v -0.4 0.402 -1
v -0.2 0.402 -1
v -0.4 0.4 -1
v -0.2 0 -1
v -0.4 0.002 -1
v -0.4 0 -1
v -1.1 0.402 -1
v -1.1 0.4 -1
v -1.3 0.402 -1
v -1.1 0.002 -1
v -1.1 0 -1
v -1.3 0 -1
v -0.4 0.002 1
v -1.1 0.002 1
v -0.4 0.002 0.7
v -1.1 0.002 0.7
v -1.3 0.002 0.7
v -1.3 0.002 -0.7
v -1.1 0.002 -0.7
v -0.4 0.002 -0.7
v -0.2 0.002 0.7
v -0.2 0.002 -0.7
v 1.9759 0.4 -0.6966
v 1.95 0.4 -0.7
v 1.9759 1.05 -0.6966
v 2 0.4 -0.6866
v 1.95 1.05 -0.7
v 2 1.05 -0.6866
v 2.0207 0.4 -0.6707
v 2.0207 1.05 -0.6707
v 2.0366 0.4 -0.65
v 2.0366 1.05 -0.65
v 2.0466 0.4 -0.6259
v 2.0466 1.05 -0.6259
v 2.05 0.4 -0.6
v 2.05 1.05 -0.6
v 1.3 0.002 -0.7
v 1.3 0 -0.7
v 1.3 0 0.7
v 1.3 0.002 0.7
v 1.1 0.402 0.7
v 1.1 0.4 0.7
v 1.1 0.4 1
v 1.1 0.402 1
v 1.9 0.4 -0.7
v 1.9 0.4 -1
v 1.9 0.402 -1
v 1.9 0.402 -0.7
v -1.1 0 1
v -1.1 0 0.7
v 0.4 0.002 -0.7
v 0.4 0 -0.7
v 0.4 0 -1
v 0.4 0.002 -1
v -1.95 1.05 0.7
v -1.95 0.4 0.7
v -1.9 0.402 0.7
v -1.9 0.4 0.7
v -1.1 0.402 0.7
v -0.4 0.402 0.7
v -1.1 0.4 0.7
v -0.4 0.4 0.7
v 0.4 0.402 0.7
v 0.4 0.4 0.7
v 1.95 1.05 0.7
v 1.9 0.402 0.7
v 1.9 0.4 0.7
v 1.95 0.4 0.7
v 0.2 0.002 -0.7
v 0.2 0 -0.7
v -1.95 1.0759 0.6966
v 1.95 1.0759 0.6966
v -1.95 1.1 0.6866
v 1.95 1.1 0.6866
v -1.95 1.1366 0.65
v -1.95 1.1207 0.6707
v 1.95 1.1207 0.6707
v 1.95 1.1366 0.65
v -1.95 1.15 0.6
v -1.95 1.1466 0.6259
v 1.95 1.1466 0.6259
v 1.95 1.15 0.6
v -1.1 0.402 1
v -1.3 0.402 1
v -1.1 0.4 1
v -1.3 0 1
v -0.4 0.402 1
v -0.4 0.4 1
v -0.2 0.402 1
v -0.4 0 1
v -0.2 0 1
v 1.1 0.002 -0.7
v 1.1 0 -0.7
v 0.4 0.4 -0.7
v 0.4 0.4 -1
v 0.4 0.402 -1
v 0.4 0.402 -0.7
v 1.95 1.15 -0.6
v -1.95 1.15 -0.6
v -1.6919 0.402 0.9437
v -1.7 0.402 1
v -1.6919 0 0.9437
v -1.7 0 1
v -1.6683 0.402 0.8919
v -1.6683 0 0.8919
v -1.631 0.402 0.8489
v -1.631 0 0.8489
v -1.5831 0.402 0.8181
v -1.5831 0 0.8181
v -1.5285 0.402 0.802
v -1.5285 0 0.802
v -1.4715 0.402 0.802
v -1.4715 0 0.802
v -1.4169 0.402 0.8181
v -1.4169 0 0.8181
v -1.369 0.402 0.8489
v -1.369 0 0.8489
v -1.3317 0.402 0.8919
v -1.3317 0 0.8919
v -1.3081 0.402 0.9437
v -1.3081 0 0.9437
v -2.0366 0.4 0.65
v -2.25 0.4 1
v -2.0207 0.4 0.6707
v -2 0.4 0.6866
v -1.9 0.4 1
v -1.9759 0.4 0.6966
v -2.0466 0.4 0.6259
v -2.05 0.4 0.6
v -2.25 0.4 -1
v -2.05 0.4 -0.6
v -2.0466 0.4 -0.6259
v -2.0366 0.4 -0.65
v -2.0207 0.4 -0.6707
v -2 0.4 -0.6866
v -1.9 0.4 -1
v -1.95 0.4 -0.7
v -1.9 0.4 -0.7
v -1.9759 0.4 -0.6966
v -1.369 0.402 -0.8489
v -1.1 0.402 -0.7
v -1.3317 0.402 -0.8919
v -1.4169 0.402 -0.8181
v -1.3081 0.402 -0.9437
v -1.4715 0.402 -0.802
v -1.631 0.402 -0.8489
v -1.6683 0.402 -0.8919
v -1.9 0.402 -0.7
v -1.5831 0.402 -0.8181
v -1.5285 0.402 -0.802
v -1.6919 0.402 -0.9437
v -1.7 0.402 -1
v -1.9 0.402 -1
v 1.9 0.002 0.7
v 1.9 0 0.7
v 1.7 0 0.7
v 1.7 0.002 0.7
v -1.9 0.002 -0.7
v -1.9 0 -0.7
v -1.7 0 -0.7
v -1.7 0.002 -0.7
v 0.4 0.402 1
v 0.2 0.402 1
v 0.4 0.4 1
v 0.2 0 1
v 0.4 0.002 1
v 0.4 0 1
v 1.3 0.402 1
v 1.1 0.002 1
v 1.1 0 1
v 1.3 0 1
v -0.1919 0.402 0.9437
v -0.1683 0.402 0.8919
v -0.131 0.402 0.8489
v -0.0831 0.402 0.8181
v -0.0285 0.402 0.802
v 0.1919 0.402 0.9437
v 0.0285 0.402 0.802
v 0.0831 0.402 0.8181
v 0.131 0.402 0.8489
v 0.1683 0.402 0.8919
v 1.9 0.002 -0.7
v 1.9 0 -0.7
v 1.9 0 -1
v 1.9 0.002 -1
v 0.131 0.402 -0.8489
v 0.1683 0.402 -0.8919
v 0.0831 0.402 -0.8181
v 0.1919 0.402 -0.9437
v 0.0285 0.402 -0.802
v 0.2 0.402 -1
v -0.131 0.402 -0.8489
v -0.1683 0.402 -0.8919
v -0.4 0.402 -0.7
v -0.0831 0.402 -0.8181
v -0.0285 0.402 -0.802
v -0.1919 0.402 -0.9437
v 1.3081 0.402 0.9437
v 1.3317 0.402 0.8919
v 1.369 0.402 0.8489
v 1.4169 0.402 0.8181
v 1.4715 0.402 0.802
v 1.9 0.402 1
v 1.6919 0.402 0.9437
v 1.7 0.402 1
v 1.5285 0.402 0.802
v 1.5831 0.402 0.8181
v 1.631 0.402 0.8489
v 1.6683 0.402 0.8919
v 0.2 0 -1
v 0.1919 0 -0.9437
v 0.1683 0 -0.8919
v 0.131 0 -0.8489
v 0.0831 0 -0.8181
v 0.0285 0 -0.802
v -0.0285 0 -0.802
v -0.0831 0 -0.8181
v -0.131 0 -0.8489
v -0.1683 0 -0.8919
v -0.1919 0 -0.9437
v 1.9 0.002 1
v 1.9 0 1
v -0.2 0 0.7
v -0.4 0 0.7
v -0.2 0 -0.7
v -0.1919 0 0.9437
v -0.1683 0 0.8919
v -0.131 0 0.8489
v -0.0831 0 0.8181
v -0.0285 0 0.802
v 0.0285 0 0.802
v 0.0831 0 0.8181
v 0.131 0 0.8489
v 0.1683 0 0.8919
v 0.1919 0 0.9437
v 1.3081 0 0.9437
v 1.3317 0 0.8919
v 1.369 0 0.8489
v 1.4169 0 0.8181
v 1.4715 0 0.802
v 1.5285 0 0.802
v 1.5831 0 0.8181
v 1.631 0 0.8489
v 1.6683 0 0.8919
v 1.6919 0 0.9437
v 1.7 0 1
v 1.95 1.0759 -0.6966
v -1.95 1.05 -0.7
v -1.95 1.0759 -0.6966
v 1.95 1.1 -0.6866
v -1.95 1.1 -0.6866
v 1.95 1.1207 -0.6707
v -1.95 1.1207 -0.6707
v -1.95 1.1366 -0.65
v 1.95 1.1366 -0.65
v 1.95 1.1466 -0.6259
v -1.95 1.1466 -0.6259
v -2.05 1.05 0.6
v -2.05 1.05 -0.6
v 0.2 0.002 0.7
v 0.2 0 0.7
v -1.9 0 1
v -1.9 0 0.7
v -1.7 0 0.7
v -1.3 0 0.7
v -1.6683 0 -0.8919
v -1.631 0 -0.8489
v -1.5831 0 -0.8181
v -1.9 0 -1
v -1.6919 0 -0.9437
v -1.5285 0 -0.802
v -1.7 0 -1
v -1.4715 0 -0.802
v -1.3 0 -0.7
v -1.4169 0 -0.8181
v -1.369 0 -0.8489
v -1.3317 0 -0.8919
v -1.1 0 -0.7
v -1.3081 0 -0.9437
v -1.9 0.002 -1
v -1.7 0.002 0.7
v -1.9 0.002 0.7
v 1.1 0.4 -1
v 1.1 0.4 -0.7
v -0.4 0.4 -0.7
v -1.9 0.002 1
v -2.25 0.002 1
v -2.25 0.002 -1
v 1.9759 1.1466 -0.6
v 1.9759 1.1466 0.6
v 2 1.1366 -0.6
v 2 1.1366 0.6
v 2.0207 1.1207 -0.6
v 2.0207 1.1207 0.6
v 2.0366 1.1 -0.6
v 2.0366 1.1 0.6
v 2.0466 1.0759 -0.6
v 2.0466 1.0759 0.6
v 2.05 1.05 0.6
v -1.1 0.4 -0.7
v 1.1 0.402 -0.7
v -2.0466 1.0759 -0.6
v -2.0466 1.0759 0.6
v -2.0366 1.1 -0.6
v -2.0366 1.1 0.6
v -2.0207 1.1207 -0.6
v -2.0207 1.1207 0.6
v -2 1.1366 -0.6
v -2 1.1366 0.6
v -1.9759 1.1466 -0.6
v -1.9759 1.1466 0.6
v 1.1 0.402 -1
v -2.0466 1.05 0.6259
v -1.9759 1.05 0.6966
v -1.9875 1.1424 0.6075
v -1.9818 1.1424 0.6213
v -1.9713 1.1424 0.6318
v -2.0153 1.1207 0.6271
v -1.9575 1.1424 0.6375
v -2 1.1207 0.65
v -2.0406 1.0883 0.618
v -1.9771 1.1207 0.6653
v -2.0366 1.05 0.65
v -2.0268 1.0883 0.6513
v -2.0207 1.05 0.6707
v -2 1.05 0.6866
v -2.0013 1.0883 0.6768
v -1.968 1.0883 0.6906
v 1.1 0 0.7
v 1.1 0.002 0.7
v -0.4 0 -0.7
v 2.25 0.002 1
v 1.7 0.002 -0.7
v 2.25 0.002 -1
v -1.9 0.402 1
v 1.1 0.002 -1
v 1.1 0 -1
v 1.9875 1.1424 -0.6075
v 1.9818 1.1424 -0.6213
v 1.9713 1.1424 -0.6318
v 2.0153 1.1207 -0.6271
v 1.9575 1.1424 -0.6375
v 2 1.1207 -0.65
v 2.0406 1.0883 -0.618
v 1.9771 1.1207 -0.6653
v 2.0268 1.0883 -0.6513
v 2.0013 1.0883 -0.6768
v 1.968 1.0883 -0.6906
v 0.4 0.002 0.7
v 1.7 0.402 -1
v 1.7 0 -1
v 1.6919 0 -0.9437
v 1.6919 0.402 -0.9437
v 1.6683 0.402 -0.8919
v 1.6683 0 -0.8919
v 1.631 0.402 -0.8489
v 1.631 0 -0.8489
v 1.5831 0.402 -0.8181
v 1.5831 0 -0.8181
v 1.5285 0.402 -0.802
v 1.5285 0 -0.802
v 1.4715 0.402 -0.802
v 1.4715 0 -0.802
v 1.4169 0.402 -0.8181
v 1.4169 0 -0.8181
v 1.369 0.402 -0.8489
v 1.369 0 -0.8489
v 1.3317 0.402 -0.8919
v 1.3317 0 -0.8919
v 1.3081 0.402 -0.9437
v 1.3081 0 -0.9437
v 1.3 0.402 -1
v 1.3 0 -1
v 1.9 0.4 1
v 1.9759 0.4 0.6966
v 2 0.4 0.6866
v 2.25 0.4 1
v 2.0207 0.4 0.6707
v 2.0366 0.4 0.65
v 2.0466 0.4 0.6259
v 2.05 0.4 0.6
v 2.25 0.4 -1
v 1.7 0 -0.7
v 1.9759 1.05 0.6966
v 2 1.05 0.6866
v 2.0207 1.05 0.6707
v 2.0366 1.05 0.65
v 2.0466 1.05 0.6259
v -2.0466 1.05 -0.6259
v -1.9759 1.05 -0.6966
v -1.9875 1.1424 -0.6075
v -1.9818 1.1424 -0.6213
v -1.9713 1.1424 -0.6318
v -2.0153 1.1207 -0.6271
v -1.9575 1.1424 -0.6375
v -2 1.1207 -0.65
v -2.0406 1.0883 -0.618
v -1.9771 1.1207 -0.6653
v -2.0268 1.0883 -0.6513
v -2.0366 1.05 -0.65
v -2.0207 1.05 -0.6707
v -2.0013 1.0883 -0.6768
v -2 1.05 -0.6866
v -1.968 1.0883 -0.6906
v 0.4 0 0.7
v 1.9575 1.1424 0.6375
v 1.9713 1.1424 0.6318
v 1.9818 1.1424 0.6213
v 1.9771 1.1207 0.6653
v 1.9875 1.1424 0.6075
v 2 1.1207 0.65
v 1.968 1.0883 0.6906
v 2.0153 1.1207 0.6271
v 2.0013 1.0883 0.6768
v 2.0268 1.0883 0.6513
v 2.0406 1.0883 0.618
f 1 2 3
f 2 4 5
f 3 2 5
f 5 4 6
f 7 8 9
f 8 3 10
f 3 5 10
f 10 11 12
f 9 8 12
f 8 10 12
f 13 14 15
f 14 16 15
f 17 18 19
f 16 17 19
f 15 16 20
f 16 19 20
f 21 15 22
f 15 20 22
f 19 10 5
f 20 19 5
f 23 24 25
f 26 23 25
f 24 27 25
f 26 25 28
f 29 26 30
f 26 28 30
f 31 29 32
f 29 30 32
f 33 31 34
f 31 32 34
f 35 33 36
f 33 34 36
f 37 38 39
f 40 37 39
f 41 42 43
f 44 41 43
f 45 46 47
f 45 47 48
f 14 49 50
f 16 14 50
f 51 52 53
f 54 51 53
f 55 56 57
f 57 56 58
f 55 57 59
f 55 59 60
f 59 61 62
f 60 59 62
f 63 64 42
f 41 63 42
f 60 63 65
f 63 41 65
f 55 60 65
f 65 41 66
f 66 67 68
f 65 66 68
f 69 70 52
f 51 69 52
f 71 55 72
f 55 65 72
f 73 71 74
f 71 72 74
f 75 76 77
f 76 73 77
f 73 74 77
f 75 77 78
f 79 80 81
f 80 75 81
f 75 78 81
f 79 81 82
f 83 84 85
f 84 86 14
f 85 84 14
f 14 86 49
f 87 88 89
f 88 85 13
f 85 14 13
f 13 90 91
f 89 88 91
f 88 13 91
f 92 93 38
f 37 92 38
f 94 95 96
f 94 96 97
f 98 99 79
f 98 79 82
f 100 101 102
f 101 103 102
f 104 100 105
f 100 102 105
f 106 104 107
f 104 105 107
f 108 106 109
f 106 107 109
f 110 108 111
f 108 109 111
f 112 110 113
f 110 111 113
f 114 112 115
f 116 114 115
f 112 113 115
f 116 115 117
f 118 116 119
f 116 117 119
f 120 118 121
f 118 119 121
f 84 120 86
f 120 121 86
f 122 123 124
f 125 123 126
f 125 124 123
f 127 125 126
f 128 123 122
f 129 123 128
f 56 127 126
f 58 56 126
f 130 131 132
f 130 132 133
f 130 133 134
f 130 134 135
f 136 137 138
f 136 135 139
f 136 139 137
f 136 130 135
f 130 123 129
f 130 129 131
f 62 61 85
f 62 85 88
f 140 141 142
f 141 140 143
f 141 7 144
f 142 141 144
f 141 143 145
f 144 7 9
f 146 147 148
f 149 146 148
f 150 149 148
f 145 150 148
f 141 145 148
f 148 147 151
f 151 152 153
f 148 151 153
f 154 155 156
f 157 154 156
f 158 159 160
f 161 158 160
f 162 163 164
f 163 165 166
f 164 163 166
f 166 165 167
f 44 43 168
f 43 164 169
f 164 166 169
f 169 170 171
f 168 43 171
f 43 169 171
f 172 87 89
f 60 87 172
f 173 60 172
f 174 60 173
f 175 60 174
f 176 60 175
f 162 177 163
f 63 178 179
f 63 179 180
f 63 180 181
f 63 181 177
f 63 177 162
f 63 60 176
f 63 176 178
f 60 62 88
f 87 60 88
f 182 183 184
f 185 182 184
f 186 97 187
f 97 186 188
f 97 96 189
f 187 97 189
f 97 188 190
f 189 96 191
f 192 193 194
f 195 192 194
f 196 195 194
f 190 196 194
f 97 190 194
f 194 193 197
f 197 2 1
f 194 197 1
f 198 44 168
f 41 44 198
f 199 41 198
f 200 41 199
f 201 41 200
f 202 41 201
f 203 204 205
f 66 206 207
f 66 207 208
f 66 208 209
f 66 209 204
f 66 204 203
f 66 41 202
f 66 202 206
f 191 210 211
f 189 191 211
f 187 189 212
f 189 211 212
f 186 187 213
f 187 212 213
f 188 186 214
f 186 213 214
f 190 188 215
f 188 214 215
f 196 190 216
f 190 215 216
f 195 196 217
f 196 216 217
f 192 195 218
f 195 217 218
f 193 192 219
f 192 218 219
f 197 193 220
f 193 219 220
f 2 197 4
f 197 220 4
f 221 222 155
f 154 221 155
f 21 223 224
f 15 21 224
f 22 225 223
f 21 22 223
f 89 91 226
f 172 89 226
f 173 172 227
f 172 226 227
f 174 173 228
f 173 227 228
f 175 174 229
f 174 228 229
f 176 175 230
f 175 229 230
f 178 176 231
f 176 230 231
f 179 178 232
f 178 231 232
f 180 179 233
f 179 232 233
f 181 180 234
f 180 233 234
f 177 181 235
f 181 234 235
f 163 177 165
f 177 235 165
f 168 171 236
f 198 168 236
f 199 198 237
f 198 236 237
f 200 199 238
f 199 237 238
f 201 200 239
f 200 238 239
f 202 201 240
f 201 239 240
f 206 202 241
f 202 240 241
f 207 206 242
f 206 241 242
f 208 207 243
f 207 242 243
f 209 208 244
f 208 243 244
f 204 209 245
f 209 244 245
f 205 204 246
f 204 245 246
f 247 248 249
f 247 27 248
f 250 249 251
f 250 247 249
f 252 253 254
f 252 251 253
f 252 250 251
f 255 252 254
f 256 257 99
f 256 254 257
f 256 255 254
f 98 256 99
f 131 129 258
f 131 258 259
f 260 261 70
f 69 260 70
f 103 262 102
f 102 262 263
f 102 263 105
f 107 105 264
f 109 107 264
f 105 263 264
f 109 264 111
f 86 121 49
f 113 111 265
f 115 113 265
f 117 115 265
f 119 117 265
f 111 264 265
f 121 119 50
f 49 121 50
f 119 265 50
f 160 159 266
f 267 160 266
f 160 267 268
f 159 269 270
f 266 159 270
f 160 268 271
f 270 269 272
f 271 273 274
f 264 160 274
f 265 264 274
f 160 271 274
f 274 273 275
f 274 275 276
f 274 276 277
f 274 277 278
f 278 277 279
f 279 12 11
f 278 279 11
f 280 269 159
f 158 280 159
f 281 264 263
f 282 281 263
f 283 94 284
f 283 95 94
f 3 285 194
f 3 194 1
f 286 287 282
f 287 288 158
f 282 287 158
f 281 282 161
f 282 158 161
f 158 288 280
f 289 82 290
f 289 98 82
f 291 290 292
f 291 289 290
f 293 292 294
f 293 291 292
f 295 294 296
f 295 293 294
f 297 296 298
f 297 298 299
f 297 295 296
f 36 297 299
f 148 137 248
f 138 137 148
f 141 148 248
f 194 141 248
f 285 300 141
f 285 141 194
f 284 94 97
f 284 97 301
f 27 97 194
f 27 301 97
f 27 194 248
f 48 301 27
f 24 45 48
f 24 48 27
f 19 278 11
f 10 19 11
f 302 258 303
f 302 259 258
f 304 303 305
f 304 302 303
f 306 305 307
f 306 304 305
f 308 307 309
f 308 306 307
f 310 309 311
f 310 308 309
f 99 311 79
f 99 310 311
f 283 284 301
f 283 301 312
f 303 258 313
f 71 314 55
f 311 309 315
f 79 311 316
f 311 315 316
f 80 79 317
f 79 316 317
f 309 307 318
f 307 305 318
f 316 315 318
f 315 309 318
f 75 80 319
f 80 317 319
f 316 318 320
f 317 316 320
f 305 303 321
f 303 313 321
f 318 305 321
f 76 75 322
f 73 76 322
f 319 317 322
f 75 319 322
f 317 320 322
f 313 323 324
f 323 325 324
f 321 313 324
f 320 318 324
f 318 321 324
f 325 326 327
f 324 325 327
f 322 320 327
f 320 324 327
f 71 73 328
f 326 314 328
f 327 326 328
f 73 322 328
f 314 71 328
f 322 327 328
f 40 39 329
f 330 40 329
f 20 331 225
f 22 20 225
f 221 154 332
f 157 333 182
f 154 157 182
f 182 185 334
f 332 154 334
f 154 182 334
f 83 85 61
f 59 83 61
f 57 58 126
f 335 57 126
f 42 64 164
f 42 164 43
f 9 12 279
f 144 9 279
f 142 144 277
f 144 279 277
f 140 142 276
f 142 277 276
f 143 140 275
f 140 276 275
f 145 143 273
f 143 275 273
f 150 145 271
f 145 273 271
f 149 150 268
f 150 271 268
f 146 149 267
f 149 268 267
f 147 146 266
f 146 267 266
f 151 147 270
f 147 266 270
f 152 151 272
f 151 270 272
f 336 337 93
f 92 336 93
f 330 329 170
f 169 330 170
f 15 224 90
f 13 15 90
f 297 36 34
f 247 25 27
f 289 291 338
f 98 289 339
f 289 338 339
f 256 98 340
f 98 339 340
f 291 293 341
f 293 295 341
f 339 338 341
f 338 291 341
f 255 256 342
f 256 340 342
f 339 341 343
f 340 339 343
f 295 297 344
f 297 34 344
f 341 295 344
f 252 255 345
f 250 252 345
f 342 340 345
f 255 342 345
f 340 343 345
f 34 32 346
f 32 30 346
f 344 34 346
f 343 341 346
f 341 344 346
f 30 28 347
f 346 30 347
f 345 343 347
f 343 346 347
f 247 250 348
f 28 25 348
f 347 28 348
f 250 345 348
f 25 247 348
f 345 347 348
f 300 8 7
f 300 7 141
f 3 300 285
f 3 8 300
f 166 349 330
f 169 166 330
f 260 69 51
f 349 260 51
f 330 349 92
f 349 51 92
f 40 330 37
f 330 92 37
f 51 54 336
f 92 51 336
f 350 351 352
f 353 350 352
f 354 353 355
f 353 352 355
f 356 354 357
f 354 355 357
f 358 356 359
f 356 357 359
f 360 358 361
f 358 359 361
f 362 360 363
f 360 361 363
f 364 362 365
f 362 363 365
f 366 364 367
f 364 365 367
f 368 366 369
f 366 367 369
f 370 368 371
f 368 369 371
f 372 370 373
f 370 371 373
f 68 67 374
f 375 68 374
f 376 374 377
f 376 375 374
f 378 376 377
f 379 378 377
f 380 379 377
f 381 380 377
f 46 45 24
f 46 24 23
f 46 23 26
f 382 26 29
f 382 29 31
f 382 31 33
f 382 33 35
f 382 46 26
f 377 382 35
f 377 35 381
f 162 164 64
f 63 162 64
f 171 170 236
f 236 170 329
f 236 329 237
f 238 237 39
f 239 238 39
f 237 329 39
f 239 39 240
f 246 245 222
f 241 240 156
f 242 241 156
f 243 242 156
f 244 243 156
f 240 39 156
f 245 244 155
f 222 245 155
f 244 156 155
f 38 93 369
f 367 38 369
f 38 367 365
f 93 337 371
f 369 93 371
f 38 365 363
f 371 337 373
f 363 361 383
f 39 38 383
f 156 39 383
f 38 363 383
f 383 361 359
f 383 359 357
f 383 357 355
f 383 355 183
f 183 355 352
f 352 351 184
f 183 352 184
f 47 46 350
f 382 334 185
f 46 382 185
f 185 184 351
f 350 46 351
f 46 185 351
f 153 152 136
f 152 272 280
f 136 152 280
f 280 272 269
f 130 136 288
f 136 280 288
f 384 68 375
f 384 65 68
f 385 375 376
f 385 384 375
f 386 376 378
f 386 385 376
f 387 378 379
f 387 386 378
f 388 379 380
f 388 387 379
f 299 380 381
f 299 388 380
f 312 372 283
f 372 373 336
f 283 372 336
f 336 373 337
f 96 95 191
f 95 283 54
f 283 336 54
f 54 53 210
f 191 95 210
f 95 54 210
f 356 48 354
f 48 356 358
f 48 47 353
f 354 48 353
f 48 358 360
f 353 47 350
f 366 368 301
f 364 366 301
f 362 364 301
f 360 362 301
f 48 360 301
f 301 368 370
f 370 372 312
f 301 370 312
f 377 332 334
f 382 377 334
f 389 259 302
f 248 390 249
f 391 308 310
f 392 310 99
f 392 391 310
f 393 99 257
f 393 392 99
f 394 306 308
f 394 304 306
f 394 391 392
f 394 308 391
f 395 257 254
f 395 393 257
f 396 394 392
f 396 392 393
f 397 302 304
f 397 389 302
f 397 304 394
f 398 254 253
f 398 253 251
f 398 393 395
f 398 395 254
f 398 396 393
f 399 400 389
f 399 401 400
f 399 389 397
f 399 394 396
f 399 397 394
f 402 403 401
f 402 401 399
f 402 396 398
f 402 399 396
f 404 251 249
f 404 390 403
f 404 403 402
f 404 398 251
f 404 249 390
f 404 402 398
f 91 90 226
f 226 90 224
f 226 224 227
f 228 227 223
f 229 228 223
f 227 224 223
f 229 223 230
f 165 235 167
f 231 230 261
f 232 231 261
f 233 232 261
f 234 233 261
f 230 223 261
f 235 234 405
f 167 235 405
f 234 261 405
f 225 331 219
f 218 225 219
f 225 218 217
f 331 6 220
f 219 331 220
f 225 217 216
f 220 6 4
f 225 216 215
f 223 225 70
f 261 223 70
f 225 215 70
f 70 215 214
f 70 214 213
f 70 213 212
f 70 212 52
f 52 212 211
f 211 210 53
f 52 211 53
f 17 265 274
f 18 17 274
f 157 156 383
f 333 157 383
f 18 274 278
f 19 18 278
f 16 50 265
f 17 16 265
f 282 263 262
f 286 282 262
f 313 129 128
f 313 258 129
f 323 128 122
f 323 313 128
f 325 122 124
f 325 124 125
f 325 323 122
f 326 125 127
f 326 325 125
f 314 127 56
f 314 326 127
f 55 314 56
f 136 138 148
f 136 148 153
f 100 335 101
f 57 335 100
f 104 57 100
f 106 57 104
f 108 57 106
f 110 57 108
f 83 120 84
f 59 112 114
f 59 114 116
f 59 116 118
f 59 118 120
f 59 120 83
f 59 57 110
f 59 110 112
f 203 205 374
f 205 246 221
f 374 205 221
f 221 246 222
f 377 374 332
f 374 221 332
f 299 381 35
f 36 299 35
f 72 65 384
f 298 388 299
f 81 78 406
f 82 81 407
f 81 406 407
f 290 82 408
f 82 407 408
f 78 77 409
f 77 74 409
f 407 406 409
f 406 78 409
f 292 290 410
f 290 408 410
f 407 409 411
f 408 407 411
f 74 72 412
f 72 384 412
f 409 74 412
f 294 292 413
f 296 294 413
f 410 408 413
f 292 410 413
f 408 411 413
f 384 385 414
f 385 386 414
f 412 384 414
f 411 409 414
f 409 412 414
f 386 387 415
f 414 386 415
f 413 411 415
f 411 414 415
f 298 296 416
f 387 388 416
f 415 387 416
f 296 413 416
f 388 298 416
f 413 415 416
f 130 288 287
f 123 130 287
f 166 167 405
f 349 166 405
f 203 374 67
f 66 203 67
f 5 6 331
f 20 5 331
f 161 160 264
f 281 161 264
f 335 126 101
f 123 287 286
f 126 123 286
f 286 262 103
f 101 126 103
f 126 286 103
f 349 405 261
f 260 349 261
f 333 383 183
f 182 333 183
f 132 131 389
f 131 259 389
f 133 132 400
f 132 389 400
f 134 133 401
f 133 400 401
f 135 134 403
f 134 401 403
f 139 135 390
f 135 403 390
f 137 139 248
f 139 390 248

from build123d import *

# Parameters (mm, degrees)
EXTRUDE1_START = 0.002
EXTRUDE1_DEPTH = 0.398
EXTRUDE2_REACH = 2.4
EXTRUDE3_DEPTH = 0.002
SKETCH4_W      = 4.1
SKETCH4_H      = 1.4
EXTRUDE4_DEPTH = 0.75
FILLET1_R      = 0.1


with BuildPart() as part:
    # Sketch1 → Extrude1 (new body)
    with BuildSketch(Plane(origin=(0, 0, 0), x_dir=(1, 0, 0), z_dir=(0, 1, 0)).offset(EXTRUDE1_START)):
        with BuildLine():
            Line((1.7, -1), (2.25, -1))
            Line((2.25, -1), (2.25, 1))
            Line((2.25, 1), (1.7, 1))
            ThreePointArc((1.7, 1), (1.5, 0.8), (1.3, 1))
            Line((1.3, 1), (0.2, 1))
            ThreePointArc((0.2, 1), (0, 0.8), (-0.2, 1))
            Line((-0.2, 1), (-1.3, 1))
            ThreePointArc((-1.3, 1), (-1.5, 0.8), (-1.7, 1))
            Line((-1.7, 1), (-2.25, 1))
            Line((-2.25, 1), (-2.25, -1))
            Line((-2.25, -1), (-1.7, -1))
            ThreePointArc((-1.7, -1), (-1.5, -0.8), (-1.3, -1))
            Line((-1.3, -1), (-0.2, -1))
            ThreePointArc((-0.2, -1), (0, -0.8), (0.2, -1))
            Line((0.2, -1), (1.3, -1))
            ThreePointArc((1.3, -1), (1.5, -0.8), (1.7, -1))
        make_face()
    extrude(amount=EXTRUDE1_DEPTH)

    # Sketch2 → Extrude2 (add, up to next)
    with BuildSketch(Plane(origin=(0, 0, 0), x_dir=(1, 0, 0), z_dir=(0, 1, 0)), mode=Mode.PRIVATE) as extrude2_sk1:
        with BuildLine():
            Line((-1.9, -1), (-1.7, -1))
            ThreePointArc((-1.7, -1), (-1.5, -0.8), (-1.3, -1))
            Line((-1.3, -1), (-1.1, -1))
            Line((-1.1, -1), (-1.1, -0.7))
            Line((-1.1, -0.7), (-1.3, -0.7))
            Line((-1.3, -0.7), (-1.3, 0.7))
            Line((-1.3, 0.7), (-1.1, 0.7))
            Line((-1.1, 0.7), (-1.1, 1))
            Line((-1.1, 1), (-1.3, 1))
            ThreePointArc((-1.3, 1), (-1.5, 0.8), (-1.7, 1))
            Line((-1.7, 1), (-1.9, 1))
            Line((-1.9, 1), (-1.9, 0.7))
            Line((-1.9, 0.7), (-1.7, 0.7))
            Line((-1.7, 0.7), (-1.7, -0.7))
            Line((-1.7, -0.7), (-1.9, -0.7))
            Line((-1.9, -0.7), (-1.9, -1))
        make_face()
    extrude2_tool1 = extrude(extrude2_sk1.sketch, amount=EXTRUDE2_REACH, mode=Mode.PRIVATE) - part.part
    add(extrude2_tool1.solids().sort_by_distance((-1.5, 0, 0))[0])
    # Sketch2 → Extrude2 (add, up to next)
    with BuildSketch(Plane(origin=(0, 0, 0), x_dir=(1, 0, 0), z_dir=(0, 1, 0)), mode=Mode.PRIVATE) as extrude2_sk2:
        with BuildLine():
            Line((-0.4, -1), (-0.2, -1))
            ThreePointArc((-0.2, -1), (0, -0.8), (0.2, -1))
            Line((0.2, -1), (0.4, -1))
            Line((0.4, -1), (0.4, -0.7))
            Line((0.4, -0.7), (0.2, -0.7))
            Line((0.2, -0.7), (0.2, 0.7))
            Line((0.2, 0.7), (0.4, 0.7))
            Line((0.4, 0.7), (0.4, 1))
            Line((0.4, 1), (0.2, 1))
            ThreePointArc((0.2, 1), (0, 0.8), (-0.2, 1))
            Line((-0.2, 1), (-0.4, 1))
            Line((-0.4, 1), (-0.4, 0.7))
            Line((-0.4, 0.7), (-0.2, 0.7))
            Line((-0.2, 0.7), (-0.2, -0.7))
            Line((-0.2, -0.7), (-0.4, -0.7))
            Line((-0.4, -0.7), (-0.4, -1))
        make_face()
    extrude2_tool2 = extrude(extrude2_sk2.sketch, amount=EXTRUDE2_REACH, mode=Mode.PRIVATE) - part.part
    add(extrude2_tool2.solids().sort_by_distance((0, 0, 0))[0])
    # Sketch2 → Extrude2 (add, up to next)
    with BuildSketch(Plane(origin=(0, 0, 0), x_dir=(1, 0, 0), z_dir=(0, 1, 0)), mode=Mode.PRIVATE) as extrude2_sk3:
        with BuildLine():
            Line((1.1, -1), (1.3, -1))
            ThreePointArc((1.3, -1), (1.5, -0.8), (1.7, -1))
            Line((1.7, -1), (1.9, -1))
            Line((1.9, -1), (1.9, -0.7))
            Line((1.9, -0.7), (1.7, -0.7))
            Line((1.7, -0.7), (1.7, 0.7))
            Line((1.7, 0.7), (1.9, 0.7))
            Line((1.9, 0.7), (1.9, 1))
            Line((1.9, 1), (1.7, 1))
            ThreePointArc((1.7, 1), (1.5, 0.8), (1.3, 1))
            Line((1.3, 1), (1.1, 1))
            Line((1.1, 1), (1.1, 0.7))
            Line((1.1, 0.7), (1.3, 0.7))
            Line((1.3, 0.7), (1.3, -0.7))
            Line((1.3, -0.7), (1.1, -0.7))
            Line((1.1, -0.7), (1.1, -1))
        make_face()
    extrude2_tool3 = extrude(extrude2_sk3.sketch, amount=EXTRUDE2_REACH, mode=Mode.PRIVATE) - part.part
    add(extrude2_tool3.solids().sort_by_distance((1.5, 0, 0))[0])

    # Sketch3 → Extrude3 (add)
    with BuildSketch(Plane(origin=(0, 0.4, 0), x_dir=(1, 0, 0), z_dir=(0, 1, 0))):
        with BuildLine():
            Line((-1.9, -1), (-1.7, -1))
            ThreePointArc((-1.7, -1), (-1.5, -0.8), (-1.3, -1))
            Line((-1.3, -1), (-1.1, -1))
            Line((-1.1, -1), (-1.1, -0.7))
            Line((-1.1, -0.7), (-1.9, -0.7))
            Line((-1.9, -0.7), (-1.9, -1))
        make_face()
        with BuildLine():
            Line((-0.4, -1), (-0.2, -1))
            ThreePointArc((-0.2, -1), (0, -0.8), (0.2, -1))
            Line((0.2, -1), (0.4, -1))
            Line((0.4, -1), (0.4, -0.7))
            Line((0.4, -0.7), (-0.4, -0.7))
            Line((-0.4, -0.7), (-0.4, -1))
        make_face()
        with BuildLine():
            Line((1.1, -1), (1.3, -1))
            ThreePointArc((1.3, -1), (1.5, -0.8), (1.7, -1))
            Line((1.7, -1), (1.9, -1))
            Line((1.9, -1), (1.9, -0.7))
            Line((1.9, -0.7), (1.1, -0.7))
            Line((1.1, -0.7), (1.1, -1))
        make_face()
        with BuildLine():
            Line((-1.3, 1), (-1.1, 1))
            Line((-1.1, 1), (-1.1, 0.7))
            Line((-1.1, 0.7), (-1.9, 0.7))
            Line((-1.9, 0.7), (-1.9, 1))
            Line((-1.9, 1), (-1.7, 1))
            ThreePointArc((-1.7, 1), (-1.5, 0.8), (-1.3, 1))
        make_face()
        with BuildLine():
            Line((0.2, 1), (0.4, 1))
            Line((0.4, 1), (0.4, 0.7))
            Line((0.4, 0.7), (-0.4, 0.7))
            Line((-0.4, 0.7), (-0.4, 1))
            Line((-0.4, 1), (-0.2, 1))
            ThreePointArc((-0.2, 1), (0, 0.8), (0.2, 1))
        make_face()
        with BuildLine():
            Line((1.7, 1), (1.9, 1))
            Line((1.9, 1), (1.9, 0.7))
            Line((1.9, 0.7), (1.1, 0.7))
            Line((1.1, 0.7), (1.1, 1))
            Line((1.1, 1), (1.3, 1))
            ThreePointArc((1.3, 1), (1.5, 0.8), (1.7, 1))
        make_face()
    extrude(amount=EXTRUDE3_DEPTH)

    # Sketch4 → Extrude4 (add)
    with BuildSketch(Plane(origin=(0, 0.4, 0), x_dir=(1, 0, 0), z_dir=(0, 1, 0))):
        Rectangle(SKETCH4_W, SKETCH4_H)
    extrude(amount=EXTRUDE4_DEPTH)

    # Fillet1
    fillet1_edges = [part.edges().sort_by_distance(p)[0] for p in [
        (2.05, 0.775, -0.7),
        (-2.05, 0.775, 0.7),
        (-2.05, 0.775, -0.7),
        (2.05, 0.775, 0.7),
        (-2.05, 1.15, 0),
        (0, 1.15, 0.7),
        (2.05, 1.15, 0),
        (0, 1.15, -0.7),
    ]]
    fillet(fillet1_edges, radius=FILLET1_R)


solid = part.part
